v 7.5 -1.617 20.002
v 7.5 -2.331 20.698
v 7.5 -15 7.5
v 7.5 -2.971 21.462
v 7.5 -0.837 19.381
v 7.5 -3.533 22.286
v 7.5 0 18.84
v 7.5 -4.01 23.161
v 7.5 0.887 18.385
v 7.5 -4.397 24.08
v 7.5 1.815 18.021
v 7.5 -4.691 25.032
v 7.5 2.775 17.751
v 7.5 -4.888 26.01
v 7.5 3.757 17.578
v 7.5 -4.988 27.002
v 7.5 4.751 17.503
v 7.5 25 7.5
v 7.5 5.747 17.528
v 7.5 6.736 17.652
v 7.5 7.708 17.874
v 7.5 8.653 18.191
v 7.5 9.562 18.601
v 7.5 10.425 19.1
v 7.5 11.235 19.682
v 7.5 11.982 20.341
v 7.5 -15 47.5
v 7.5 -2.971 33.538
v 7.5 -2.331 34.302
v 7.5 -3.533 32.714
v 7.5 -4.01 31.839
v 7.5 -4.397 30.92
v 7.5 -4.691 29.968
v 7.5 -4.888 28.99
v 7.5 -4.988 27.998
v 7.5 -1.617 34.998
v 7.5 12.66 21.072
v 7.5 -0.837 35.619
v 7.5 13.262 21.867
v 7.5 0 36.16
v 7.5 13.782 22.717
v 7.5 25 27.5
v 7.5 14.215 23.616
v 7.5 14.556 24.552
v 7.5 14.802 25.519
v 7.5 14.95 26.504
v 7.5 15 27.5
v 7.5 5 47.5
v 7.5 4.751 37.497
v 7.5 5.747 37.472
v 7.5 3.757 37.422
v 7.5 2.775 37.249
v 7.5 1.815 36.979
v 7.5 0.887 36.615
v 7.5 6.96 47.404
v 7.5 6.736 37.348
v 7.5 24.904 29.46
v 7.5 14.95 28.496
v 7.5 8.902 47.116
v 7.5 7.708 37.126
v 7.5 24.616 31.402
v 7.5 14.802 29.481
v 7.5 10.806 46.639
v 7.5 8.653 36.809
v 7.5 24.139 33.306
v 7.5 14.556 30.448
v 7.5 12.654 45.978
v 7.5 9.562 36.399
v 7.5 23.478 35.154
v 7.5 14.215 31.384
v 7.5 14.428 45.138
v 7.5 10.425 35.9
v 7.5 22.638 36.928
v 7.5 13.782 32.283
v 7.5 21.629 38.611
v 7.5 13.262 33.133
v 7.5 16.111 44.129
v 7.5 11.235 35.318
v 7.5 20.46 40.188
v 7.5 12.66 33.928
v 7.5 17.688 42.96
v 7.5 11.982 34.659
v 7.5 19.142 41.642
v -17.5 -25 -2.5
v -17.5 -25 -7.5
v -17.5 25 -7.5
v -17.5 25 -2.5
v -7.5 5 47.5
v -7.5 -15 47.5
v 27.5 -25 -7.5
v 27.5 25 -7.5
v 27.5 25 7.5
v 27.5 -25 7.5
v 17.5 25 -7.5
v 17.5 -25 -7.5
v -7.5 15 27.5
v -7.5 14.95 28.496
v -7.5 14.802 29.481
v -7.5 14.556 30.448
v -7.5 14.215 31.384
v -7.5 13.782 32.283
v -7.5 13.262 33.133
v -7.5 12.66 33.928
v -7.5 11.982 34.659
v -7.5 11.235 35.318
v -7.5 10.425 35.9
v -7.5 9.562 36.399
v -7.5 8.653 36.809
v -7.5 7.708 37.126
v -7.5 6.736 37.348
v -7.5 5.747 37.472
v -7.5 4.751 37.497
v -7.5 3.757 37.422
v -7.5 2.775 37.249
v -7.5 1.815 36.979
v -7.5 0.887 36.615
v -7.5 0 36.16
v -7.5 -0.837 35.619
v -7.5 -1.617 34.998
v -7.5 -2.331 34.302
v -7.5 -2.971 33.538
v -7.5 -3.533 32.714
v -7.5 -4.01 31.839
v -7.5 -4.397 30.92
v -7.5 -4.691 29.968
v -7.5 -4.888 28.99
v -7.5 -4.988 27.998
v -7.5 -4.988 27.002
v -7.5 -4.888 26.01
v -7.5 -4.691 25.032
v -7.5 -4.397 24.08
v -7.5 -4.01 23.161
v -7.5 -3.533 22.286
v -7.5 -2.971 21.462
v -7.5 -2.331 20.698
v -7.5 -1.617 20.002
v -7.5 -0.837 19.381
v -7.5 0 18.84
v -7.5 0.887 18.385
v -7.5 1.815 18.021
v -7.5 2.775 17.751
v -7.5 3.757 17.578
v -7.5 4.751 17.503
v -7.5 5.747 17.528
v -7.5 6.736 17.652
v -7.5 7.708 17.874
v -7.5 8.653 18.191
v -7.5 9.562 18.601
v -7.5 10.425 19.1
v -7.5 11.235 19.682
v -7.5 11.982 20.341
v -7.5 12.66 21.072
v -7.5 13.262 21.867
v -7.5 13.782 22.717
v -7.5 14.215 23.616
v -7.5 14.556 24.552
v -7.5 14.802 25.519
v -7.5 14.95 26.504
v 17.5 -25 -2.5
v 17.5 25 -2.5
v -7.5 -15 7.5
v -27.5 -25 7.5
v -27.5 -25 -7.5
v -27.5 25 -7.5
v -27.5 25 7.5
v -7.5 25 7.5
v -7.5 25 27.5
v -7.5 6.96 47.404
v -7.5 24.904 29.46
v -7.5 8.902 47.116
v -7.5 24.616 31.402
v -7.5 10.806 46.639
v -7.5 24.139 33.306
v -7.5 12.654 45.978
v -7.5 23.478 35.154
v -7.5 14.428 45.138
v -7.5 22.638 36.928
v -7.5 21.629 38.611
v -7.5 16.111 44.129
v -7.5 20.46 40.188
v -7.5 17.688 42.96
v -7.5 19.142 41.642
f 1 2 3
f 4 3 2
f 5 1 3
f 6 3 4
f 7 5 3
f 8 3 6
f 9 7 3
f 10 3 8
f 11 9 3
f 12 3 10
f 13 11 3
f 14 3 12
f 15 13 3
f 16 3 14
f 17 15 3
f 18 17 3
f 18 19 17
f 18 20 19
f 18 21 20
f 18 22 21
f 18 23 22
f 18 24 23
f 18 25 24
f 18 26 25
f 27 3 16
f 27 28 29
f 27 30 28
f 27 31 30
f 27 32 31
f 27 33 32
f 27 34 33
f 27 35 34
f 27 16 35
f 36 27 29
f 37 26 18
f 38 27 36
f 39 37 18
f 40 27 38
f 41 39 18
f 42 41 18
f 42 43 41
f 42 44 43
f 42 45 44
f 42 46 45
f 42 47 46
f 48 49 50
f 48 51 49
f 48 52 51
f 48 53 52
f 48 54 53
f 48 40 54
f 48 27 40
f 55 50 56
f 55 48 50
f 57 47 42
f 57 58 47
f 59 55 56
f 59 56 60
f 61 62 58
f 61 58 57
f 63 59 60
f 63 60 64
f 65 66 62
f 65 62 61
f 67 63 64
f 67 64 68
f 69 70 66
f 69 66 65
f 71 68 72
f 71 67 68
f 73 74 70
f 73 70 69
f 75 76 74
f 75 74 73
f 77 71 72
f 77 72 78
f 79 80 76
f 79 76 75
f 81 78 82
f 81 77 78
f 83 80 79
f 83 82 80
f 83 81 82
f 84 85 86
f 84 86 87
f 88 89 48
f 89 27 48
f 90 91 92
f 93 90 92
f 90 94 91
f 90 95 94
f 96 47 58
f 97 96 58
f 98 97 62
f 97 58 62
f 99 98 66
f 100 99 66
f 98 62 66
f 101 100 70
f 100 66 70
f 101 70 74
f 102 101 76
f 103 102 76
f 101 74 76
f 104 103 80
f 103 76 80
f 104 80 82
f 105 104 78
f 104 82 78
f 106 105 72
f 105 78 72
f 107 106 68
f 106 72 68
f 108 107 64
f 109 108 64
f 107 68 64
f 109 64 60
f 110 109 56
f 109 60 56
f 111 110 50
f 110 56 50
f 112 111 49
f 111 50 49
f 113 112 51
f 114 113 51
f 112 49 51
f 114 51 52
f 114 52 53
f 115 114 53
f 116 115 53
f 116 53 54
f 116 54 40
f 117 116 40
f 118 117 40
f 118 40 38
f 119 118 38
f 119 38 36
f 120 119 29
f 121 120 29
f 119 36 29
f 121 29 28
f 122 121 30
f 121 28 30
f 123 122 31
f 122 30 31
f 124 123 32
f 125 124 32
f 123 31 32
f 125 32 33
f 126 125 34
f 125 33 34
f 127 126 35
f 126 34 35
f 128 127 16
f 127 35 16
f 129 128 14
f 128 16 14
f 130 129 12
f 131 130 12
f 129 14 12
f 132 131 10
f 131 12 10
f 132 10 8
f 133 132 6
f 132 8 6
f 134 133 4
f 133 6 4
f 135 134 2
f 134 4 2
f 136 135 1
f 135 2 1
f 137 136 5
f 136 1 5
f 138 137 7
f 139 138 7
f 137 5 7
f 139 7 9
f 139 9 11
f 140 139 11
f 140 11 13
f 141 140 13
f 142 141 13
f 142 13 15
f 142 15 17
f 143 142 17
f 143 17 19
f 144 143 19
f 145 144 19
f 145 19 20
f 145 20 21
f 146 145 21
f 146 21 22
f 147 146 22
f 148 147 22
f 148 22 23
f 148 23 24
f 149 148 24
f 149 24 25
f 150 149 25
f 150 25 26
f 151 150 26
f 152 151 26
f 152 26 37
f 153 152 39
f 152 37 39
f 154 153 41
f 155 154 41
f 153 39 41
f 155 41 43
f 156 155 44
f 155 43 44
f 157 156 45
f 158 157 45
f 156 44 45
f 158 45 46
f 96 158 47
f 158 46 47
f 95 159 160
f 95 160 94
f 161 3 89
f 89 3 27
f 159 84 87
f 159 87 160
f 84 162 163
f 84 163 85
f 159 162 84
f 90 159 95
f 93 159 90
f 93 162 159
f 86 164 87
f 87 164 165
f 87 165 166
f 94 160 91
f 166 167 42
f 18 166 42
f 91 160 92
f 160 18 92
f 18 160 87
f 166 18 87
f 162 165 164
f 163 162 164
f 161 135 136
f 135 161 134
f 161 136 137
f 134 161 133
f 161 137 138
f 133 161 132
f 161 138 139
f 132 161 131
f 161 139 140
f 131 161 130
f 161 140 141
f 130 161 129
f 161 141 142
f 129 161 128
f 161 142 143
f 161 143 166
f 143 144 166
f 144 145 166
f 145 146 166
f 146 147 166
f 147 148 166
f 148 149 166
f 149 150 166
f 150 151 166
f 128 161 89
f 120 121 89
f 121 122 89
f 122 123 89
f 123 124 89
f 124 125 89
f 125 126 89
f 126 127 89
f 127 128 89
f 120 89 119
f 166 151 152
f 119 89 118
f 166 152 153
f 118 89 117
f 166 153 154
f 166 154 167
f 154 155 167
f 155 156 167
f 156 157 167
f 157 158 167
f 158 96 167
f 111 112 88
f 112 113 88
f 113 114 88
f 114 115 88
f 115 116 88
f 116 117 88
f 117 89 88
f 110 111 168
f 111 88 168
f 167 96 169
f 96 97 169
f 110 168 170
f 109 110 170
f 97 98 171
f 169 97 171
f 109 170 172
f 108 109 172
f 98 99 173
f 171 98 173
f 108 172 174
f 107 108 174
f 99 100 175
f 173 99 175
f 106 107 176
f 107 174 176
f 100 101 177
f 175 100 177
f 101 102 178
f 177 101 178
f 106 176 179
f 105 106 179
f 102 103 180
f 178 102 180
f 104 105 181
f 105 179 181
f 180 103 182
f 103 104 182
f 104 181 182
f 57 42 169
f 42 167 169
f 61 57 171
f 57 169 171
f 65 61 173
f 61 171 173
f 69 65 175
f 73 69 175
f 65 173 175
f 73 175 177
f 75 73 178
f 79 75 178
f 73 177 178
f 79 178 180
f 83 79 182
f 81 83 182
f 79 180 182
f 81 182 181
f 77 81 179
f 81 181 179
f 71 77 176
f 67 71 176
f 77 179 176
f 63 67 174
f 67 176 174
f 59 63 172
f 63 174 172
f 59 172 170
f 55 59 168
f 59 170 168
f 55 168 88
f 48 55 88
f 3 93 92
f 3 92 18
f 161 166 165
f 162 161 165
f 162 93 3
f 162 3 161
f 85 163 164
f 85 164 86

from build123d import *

# Parameters (mm, degrees)
F1_DEPTH = 25
F2_W     = 40
F2_H     = 40
F3_DEPTH = 7.5
F4_R     = 10
F5_DEPTH = 15
F6_R     = 20


with BuildPart() as f1:
    # F0 (on Front) → F1 (new body, symmetric)
    with BuildSketch(Plane.XZ):
        Polygon((27.5, 7.5), (-27.5, 7.5), (-27.5, -7.5), (-17.5, -7.5), (-17.5, -2.5), (17.5, -2.5), (17.5, -7.5), (27.5, -7.5), align=None)
    extrude(amount=F1_DEPTH, both=True)

    # F2 (on Right) → F3 (join, symmetric)
    with BuildSketch(Plane.YZ):
        with Locations((5, 27.5)):
            Rectangle(F2_W, F2_H)
    extrude(amount=F3_DEPTH, both=True)

    # F4 (on face) → F5 (cut, through all)
    with BuildSketch(Plane.YZ.offset(7.5)):
        with Locations((5, 27.5)):
            Circle(F4_R)
    extrude(amount=-F5_DEPTH, mode=Mode.SUBTRACT)

    # F6
    f6_edges = [f1.edges().sort_by_distance(p)[0] for p in [
        (0, 25, 47.5),
    ]]
    fillet(f6_edges, radius=F6_R)


solid = f1.part
